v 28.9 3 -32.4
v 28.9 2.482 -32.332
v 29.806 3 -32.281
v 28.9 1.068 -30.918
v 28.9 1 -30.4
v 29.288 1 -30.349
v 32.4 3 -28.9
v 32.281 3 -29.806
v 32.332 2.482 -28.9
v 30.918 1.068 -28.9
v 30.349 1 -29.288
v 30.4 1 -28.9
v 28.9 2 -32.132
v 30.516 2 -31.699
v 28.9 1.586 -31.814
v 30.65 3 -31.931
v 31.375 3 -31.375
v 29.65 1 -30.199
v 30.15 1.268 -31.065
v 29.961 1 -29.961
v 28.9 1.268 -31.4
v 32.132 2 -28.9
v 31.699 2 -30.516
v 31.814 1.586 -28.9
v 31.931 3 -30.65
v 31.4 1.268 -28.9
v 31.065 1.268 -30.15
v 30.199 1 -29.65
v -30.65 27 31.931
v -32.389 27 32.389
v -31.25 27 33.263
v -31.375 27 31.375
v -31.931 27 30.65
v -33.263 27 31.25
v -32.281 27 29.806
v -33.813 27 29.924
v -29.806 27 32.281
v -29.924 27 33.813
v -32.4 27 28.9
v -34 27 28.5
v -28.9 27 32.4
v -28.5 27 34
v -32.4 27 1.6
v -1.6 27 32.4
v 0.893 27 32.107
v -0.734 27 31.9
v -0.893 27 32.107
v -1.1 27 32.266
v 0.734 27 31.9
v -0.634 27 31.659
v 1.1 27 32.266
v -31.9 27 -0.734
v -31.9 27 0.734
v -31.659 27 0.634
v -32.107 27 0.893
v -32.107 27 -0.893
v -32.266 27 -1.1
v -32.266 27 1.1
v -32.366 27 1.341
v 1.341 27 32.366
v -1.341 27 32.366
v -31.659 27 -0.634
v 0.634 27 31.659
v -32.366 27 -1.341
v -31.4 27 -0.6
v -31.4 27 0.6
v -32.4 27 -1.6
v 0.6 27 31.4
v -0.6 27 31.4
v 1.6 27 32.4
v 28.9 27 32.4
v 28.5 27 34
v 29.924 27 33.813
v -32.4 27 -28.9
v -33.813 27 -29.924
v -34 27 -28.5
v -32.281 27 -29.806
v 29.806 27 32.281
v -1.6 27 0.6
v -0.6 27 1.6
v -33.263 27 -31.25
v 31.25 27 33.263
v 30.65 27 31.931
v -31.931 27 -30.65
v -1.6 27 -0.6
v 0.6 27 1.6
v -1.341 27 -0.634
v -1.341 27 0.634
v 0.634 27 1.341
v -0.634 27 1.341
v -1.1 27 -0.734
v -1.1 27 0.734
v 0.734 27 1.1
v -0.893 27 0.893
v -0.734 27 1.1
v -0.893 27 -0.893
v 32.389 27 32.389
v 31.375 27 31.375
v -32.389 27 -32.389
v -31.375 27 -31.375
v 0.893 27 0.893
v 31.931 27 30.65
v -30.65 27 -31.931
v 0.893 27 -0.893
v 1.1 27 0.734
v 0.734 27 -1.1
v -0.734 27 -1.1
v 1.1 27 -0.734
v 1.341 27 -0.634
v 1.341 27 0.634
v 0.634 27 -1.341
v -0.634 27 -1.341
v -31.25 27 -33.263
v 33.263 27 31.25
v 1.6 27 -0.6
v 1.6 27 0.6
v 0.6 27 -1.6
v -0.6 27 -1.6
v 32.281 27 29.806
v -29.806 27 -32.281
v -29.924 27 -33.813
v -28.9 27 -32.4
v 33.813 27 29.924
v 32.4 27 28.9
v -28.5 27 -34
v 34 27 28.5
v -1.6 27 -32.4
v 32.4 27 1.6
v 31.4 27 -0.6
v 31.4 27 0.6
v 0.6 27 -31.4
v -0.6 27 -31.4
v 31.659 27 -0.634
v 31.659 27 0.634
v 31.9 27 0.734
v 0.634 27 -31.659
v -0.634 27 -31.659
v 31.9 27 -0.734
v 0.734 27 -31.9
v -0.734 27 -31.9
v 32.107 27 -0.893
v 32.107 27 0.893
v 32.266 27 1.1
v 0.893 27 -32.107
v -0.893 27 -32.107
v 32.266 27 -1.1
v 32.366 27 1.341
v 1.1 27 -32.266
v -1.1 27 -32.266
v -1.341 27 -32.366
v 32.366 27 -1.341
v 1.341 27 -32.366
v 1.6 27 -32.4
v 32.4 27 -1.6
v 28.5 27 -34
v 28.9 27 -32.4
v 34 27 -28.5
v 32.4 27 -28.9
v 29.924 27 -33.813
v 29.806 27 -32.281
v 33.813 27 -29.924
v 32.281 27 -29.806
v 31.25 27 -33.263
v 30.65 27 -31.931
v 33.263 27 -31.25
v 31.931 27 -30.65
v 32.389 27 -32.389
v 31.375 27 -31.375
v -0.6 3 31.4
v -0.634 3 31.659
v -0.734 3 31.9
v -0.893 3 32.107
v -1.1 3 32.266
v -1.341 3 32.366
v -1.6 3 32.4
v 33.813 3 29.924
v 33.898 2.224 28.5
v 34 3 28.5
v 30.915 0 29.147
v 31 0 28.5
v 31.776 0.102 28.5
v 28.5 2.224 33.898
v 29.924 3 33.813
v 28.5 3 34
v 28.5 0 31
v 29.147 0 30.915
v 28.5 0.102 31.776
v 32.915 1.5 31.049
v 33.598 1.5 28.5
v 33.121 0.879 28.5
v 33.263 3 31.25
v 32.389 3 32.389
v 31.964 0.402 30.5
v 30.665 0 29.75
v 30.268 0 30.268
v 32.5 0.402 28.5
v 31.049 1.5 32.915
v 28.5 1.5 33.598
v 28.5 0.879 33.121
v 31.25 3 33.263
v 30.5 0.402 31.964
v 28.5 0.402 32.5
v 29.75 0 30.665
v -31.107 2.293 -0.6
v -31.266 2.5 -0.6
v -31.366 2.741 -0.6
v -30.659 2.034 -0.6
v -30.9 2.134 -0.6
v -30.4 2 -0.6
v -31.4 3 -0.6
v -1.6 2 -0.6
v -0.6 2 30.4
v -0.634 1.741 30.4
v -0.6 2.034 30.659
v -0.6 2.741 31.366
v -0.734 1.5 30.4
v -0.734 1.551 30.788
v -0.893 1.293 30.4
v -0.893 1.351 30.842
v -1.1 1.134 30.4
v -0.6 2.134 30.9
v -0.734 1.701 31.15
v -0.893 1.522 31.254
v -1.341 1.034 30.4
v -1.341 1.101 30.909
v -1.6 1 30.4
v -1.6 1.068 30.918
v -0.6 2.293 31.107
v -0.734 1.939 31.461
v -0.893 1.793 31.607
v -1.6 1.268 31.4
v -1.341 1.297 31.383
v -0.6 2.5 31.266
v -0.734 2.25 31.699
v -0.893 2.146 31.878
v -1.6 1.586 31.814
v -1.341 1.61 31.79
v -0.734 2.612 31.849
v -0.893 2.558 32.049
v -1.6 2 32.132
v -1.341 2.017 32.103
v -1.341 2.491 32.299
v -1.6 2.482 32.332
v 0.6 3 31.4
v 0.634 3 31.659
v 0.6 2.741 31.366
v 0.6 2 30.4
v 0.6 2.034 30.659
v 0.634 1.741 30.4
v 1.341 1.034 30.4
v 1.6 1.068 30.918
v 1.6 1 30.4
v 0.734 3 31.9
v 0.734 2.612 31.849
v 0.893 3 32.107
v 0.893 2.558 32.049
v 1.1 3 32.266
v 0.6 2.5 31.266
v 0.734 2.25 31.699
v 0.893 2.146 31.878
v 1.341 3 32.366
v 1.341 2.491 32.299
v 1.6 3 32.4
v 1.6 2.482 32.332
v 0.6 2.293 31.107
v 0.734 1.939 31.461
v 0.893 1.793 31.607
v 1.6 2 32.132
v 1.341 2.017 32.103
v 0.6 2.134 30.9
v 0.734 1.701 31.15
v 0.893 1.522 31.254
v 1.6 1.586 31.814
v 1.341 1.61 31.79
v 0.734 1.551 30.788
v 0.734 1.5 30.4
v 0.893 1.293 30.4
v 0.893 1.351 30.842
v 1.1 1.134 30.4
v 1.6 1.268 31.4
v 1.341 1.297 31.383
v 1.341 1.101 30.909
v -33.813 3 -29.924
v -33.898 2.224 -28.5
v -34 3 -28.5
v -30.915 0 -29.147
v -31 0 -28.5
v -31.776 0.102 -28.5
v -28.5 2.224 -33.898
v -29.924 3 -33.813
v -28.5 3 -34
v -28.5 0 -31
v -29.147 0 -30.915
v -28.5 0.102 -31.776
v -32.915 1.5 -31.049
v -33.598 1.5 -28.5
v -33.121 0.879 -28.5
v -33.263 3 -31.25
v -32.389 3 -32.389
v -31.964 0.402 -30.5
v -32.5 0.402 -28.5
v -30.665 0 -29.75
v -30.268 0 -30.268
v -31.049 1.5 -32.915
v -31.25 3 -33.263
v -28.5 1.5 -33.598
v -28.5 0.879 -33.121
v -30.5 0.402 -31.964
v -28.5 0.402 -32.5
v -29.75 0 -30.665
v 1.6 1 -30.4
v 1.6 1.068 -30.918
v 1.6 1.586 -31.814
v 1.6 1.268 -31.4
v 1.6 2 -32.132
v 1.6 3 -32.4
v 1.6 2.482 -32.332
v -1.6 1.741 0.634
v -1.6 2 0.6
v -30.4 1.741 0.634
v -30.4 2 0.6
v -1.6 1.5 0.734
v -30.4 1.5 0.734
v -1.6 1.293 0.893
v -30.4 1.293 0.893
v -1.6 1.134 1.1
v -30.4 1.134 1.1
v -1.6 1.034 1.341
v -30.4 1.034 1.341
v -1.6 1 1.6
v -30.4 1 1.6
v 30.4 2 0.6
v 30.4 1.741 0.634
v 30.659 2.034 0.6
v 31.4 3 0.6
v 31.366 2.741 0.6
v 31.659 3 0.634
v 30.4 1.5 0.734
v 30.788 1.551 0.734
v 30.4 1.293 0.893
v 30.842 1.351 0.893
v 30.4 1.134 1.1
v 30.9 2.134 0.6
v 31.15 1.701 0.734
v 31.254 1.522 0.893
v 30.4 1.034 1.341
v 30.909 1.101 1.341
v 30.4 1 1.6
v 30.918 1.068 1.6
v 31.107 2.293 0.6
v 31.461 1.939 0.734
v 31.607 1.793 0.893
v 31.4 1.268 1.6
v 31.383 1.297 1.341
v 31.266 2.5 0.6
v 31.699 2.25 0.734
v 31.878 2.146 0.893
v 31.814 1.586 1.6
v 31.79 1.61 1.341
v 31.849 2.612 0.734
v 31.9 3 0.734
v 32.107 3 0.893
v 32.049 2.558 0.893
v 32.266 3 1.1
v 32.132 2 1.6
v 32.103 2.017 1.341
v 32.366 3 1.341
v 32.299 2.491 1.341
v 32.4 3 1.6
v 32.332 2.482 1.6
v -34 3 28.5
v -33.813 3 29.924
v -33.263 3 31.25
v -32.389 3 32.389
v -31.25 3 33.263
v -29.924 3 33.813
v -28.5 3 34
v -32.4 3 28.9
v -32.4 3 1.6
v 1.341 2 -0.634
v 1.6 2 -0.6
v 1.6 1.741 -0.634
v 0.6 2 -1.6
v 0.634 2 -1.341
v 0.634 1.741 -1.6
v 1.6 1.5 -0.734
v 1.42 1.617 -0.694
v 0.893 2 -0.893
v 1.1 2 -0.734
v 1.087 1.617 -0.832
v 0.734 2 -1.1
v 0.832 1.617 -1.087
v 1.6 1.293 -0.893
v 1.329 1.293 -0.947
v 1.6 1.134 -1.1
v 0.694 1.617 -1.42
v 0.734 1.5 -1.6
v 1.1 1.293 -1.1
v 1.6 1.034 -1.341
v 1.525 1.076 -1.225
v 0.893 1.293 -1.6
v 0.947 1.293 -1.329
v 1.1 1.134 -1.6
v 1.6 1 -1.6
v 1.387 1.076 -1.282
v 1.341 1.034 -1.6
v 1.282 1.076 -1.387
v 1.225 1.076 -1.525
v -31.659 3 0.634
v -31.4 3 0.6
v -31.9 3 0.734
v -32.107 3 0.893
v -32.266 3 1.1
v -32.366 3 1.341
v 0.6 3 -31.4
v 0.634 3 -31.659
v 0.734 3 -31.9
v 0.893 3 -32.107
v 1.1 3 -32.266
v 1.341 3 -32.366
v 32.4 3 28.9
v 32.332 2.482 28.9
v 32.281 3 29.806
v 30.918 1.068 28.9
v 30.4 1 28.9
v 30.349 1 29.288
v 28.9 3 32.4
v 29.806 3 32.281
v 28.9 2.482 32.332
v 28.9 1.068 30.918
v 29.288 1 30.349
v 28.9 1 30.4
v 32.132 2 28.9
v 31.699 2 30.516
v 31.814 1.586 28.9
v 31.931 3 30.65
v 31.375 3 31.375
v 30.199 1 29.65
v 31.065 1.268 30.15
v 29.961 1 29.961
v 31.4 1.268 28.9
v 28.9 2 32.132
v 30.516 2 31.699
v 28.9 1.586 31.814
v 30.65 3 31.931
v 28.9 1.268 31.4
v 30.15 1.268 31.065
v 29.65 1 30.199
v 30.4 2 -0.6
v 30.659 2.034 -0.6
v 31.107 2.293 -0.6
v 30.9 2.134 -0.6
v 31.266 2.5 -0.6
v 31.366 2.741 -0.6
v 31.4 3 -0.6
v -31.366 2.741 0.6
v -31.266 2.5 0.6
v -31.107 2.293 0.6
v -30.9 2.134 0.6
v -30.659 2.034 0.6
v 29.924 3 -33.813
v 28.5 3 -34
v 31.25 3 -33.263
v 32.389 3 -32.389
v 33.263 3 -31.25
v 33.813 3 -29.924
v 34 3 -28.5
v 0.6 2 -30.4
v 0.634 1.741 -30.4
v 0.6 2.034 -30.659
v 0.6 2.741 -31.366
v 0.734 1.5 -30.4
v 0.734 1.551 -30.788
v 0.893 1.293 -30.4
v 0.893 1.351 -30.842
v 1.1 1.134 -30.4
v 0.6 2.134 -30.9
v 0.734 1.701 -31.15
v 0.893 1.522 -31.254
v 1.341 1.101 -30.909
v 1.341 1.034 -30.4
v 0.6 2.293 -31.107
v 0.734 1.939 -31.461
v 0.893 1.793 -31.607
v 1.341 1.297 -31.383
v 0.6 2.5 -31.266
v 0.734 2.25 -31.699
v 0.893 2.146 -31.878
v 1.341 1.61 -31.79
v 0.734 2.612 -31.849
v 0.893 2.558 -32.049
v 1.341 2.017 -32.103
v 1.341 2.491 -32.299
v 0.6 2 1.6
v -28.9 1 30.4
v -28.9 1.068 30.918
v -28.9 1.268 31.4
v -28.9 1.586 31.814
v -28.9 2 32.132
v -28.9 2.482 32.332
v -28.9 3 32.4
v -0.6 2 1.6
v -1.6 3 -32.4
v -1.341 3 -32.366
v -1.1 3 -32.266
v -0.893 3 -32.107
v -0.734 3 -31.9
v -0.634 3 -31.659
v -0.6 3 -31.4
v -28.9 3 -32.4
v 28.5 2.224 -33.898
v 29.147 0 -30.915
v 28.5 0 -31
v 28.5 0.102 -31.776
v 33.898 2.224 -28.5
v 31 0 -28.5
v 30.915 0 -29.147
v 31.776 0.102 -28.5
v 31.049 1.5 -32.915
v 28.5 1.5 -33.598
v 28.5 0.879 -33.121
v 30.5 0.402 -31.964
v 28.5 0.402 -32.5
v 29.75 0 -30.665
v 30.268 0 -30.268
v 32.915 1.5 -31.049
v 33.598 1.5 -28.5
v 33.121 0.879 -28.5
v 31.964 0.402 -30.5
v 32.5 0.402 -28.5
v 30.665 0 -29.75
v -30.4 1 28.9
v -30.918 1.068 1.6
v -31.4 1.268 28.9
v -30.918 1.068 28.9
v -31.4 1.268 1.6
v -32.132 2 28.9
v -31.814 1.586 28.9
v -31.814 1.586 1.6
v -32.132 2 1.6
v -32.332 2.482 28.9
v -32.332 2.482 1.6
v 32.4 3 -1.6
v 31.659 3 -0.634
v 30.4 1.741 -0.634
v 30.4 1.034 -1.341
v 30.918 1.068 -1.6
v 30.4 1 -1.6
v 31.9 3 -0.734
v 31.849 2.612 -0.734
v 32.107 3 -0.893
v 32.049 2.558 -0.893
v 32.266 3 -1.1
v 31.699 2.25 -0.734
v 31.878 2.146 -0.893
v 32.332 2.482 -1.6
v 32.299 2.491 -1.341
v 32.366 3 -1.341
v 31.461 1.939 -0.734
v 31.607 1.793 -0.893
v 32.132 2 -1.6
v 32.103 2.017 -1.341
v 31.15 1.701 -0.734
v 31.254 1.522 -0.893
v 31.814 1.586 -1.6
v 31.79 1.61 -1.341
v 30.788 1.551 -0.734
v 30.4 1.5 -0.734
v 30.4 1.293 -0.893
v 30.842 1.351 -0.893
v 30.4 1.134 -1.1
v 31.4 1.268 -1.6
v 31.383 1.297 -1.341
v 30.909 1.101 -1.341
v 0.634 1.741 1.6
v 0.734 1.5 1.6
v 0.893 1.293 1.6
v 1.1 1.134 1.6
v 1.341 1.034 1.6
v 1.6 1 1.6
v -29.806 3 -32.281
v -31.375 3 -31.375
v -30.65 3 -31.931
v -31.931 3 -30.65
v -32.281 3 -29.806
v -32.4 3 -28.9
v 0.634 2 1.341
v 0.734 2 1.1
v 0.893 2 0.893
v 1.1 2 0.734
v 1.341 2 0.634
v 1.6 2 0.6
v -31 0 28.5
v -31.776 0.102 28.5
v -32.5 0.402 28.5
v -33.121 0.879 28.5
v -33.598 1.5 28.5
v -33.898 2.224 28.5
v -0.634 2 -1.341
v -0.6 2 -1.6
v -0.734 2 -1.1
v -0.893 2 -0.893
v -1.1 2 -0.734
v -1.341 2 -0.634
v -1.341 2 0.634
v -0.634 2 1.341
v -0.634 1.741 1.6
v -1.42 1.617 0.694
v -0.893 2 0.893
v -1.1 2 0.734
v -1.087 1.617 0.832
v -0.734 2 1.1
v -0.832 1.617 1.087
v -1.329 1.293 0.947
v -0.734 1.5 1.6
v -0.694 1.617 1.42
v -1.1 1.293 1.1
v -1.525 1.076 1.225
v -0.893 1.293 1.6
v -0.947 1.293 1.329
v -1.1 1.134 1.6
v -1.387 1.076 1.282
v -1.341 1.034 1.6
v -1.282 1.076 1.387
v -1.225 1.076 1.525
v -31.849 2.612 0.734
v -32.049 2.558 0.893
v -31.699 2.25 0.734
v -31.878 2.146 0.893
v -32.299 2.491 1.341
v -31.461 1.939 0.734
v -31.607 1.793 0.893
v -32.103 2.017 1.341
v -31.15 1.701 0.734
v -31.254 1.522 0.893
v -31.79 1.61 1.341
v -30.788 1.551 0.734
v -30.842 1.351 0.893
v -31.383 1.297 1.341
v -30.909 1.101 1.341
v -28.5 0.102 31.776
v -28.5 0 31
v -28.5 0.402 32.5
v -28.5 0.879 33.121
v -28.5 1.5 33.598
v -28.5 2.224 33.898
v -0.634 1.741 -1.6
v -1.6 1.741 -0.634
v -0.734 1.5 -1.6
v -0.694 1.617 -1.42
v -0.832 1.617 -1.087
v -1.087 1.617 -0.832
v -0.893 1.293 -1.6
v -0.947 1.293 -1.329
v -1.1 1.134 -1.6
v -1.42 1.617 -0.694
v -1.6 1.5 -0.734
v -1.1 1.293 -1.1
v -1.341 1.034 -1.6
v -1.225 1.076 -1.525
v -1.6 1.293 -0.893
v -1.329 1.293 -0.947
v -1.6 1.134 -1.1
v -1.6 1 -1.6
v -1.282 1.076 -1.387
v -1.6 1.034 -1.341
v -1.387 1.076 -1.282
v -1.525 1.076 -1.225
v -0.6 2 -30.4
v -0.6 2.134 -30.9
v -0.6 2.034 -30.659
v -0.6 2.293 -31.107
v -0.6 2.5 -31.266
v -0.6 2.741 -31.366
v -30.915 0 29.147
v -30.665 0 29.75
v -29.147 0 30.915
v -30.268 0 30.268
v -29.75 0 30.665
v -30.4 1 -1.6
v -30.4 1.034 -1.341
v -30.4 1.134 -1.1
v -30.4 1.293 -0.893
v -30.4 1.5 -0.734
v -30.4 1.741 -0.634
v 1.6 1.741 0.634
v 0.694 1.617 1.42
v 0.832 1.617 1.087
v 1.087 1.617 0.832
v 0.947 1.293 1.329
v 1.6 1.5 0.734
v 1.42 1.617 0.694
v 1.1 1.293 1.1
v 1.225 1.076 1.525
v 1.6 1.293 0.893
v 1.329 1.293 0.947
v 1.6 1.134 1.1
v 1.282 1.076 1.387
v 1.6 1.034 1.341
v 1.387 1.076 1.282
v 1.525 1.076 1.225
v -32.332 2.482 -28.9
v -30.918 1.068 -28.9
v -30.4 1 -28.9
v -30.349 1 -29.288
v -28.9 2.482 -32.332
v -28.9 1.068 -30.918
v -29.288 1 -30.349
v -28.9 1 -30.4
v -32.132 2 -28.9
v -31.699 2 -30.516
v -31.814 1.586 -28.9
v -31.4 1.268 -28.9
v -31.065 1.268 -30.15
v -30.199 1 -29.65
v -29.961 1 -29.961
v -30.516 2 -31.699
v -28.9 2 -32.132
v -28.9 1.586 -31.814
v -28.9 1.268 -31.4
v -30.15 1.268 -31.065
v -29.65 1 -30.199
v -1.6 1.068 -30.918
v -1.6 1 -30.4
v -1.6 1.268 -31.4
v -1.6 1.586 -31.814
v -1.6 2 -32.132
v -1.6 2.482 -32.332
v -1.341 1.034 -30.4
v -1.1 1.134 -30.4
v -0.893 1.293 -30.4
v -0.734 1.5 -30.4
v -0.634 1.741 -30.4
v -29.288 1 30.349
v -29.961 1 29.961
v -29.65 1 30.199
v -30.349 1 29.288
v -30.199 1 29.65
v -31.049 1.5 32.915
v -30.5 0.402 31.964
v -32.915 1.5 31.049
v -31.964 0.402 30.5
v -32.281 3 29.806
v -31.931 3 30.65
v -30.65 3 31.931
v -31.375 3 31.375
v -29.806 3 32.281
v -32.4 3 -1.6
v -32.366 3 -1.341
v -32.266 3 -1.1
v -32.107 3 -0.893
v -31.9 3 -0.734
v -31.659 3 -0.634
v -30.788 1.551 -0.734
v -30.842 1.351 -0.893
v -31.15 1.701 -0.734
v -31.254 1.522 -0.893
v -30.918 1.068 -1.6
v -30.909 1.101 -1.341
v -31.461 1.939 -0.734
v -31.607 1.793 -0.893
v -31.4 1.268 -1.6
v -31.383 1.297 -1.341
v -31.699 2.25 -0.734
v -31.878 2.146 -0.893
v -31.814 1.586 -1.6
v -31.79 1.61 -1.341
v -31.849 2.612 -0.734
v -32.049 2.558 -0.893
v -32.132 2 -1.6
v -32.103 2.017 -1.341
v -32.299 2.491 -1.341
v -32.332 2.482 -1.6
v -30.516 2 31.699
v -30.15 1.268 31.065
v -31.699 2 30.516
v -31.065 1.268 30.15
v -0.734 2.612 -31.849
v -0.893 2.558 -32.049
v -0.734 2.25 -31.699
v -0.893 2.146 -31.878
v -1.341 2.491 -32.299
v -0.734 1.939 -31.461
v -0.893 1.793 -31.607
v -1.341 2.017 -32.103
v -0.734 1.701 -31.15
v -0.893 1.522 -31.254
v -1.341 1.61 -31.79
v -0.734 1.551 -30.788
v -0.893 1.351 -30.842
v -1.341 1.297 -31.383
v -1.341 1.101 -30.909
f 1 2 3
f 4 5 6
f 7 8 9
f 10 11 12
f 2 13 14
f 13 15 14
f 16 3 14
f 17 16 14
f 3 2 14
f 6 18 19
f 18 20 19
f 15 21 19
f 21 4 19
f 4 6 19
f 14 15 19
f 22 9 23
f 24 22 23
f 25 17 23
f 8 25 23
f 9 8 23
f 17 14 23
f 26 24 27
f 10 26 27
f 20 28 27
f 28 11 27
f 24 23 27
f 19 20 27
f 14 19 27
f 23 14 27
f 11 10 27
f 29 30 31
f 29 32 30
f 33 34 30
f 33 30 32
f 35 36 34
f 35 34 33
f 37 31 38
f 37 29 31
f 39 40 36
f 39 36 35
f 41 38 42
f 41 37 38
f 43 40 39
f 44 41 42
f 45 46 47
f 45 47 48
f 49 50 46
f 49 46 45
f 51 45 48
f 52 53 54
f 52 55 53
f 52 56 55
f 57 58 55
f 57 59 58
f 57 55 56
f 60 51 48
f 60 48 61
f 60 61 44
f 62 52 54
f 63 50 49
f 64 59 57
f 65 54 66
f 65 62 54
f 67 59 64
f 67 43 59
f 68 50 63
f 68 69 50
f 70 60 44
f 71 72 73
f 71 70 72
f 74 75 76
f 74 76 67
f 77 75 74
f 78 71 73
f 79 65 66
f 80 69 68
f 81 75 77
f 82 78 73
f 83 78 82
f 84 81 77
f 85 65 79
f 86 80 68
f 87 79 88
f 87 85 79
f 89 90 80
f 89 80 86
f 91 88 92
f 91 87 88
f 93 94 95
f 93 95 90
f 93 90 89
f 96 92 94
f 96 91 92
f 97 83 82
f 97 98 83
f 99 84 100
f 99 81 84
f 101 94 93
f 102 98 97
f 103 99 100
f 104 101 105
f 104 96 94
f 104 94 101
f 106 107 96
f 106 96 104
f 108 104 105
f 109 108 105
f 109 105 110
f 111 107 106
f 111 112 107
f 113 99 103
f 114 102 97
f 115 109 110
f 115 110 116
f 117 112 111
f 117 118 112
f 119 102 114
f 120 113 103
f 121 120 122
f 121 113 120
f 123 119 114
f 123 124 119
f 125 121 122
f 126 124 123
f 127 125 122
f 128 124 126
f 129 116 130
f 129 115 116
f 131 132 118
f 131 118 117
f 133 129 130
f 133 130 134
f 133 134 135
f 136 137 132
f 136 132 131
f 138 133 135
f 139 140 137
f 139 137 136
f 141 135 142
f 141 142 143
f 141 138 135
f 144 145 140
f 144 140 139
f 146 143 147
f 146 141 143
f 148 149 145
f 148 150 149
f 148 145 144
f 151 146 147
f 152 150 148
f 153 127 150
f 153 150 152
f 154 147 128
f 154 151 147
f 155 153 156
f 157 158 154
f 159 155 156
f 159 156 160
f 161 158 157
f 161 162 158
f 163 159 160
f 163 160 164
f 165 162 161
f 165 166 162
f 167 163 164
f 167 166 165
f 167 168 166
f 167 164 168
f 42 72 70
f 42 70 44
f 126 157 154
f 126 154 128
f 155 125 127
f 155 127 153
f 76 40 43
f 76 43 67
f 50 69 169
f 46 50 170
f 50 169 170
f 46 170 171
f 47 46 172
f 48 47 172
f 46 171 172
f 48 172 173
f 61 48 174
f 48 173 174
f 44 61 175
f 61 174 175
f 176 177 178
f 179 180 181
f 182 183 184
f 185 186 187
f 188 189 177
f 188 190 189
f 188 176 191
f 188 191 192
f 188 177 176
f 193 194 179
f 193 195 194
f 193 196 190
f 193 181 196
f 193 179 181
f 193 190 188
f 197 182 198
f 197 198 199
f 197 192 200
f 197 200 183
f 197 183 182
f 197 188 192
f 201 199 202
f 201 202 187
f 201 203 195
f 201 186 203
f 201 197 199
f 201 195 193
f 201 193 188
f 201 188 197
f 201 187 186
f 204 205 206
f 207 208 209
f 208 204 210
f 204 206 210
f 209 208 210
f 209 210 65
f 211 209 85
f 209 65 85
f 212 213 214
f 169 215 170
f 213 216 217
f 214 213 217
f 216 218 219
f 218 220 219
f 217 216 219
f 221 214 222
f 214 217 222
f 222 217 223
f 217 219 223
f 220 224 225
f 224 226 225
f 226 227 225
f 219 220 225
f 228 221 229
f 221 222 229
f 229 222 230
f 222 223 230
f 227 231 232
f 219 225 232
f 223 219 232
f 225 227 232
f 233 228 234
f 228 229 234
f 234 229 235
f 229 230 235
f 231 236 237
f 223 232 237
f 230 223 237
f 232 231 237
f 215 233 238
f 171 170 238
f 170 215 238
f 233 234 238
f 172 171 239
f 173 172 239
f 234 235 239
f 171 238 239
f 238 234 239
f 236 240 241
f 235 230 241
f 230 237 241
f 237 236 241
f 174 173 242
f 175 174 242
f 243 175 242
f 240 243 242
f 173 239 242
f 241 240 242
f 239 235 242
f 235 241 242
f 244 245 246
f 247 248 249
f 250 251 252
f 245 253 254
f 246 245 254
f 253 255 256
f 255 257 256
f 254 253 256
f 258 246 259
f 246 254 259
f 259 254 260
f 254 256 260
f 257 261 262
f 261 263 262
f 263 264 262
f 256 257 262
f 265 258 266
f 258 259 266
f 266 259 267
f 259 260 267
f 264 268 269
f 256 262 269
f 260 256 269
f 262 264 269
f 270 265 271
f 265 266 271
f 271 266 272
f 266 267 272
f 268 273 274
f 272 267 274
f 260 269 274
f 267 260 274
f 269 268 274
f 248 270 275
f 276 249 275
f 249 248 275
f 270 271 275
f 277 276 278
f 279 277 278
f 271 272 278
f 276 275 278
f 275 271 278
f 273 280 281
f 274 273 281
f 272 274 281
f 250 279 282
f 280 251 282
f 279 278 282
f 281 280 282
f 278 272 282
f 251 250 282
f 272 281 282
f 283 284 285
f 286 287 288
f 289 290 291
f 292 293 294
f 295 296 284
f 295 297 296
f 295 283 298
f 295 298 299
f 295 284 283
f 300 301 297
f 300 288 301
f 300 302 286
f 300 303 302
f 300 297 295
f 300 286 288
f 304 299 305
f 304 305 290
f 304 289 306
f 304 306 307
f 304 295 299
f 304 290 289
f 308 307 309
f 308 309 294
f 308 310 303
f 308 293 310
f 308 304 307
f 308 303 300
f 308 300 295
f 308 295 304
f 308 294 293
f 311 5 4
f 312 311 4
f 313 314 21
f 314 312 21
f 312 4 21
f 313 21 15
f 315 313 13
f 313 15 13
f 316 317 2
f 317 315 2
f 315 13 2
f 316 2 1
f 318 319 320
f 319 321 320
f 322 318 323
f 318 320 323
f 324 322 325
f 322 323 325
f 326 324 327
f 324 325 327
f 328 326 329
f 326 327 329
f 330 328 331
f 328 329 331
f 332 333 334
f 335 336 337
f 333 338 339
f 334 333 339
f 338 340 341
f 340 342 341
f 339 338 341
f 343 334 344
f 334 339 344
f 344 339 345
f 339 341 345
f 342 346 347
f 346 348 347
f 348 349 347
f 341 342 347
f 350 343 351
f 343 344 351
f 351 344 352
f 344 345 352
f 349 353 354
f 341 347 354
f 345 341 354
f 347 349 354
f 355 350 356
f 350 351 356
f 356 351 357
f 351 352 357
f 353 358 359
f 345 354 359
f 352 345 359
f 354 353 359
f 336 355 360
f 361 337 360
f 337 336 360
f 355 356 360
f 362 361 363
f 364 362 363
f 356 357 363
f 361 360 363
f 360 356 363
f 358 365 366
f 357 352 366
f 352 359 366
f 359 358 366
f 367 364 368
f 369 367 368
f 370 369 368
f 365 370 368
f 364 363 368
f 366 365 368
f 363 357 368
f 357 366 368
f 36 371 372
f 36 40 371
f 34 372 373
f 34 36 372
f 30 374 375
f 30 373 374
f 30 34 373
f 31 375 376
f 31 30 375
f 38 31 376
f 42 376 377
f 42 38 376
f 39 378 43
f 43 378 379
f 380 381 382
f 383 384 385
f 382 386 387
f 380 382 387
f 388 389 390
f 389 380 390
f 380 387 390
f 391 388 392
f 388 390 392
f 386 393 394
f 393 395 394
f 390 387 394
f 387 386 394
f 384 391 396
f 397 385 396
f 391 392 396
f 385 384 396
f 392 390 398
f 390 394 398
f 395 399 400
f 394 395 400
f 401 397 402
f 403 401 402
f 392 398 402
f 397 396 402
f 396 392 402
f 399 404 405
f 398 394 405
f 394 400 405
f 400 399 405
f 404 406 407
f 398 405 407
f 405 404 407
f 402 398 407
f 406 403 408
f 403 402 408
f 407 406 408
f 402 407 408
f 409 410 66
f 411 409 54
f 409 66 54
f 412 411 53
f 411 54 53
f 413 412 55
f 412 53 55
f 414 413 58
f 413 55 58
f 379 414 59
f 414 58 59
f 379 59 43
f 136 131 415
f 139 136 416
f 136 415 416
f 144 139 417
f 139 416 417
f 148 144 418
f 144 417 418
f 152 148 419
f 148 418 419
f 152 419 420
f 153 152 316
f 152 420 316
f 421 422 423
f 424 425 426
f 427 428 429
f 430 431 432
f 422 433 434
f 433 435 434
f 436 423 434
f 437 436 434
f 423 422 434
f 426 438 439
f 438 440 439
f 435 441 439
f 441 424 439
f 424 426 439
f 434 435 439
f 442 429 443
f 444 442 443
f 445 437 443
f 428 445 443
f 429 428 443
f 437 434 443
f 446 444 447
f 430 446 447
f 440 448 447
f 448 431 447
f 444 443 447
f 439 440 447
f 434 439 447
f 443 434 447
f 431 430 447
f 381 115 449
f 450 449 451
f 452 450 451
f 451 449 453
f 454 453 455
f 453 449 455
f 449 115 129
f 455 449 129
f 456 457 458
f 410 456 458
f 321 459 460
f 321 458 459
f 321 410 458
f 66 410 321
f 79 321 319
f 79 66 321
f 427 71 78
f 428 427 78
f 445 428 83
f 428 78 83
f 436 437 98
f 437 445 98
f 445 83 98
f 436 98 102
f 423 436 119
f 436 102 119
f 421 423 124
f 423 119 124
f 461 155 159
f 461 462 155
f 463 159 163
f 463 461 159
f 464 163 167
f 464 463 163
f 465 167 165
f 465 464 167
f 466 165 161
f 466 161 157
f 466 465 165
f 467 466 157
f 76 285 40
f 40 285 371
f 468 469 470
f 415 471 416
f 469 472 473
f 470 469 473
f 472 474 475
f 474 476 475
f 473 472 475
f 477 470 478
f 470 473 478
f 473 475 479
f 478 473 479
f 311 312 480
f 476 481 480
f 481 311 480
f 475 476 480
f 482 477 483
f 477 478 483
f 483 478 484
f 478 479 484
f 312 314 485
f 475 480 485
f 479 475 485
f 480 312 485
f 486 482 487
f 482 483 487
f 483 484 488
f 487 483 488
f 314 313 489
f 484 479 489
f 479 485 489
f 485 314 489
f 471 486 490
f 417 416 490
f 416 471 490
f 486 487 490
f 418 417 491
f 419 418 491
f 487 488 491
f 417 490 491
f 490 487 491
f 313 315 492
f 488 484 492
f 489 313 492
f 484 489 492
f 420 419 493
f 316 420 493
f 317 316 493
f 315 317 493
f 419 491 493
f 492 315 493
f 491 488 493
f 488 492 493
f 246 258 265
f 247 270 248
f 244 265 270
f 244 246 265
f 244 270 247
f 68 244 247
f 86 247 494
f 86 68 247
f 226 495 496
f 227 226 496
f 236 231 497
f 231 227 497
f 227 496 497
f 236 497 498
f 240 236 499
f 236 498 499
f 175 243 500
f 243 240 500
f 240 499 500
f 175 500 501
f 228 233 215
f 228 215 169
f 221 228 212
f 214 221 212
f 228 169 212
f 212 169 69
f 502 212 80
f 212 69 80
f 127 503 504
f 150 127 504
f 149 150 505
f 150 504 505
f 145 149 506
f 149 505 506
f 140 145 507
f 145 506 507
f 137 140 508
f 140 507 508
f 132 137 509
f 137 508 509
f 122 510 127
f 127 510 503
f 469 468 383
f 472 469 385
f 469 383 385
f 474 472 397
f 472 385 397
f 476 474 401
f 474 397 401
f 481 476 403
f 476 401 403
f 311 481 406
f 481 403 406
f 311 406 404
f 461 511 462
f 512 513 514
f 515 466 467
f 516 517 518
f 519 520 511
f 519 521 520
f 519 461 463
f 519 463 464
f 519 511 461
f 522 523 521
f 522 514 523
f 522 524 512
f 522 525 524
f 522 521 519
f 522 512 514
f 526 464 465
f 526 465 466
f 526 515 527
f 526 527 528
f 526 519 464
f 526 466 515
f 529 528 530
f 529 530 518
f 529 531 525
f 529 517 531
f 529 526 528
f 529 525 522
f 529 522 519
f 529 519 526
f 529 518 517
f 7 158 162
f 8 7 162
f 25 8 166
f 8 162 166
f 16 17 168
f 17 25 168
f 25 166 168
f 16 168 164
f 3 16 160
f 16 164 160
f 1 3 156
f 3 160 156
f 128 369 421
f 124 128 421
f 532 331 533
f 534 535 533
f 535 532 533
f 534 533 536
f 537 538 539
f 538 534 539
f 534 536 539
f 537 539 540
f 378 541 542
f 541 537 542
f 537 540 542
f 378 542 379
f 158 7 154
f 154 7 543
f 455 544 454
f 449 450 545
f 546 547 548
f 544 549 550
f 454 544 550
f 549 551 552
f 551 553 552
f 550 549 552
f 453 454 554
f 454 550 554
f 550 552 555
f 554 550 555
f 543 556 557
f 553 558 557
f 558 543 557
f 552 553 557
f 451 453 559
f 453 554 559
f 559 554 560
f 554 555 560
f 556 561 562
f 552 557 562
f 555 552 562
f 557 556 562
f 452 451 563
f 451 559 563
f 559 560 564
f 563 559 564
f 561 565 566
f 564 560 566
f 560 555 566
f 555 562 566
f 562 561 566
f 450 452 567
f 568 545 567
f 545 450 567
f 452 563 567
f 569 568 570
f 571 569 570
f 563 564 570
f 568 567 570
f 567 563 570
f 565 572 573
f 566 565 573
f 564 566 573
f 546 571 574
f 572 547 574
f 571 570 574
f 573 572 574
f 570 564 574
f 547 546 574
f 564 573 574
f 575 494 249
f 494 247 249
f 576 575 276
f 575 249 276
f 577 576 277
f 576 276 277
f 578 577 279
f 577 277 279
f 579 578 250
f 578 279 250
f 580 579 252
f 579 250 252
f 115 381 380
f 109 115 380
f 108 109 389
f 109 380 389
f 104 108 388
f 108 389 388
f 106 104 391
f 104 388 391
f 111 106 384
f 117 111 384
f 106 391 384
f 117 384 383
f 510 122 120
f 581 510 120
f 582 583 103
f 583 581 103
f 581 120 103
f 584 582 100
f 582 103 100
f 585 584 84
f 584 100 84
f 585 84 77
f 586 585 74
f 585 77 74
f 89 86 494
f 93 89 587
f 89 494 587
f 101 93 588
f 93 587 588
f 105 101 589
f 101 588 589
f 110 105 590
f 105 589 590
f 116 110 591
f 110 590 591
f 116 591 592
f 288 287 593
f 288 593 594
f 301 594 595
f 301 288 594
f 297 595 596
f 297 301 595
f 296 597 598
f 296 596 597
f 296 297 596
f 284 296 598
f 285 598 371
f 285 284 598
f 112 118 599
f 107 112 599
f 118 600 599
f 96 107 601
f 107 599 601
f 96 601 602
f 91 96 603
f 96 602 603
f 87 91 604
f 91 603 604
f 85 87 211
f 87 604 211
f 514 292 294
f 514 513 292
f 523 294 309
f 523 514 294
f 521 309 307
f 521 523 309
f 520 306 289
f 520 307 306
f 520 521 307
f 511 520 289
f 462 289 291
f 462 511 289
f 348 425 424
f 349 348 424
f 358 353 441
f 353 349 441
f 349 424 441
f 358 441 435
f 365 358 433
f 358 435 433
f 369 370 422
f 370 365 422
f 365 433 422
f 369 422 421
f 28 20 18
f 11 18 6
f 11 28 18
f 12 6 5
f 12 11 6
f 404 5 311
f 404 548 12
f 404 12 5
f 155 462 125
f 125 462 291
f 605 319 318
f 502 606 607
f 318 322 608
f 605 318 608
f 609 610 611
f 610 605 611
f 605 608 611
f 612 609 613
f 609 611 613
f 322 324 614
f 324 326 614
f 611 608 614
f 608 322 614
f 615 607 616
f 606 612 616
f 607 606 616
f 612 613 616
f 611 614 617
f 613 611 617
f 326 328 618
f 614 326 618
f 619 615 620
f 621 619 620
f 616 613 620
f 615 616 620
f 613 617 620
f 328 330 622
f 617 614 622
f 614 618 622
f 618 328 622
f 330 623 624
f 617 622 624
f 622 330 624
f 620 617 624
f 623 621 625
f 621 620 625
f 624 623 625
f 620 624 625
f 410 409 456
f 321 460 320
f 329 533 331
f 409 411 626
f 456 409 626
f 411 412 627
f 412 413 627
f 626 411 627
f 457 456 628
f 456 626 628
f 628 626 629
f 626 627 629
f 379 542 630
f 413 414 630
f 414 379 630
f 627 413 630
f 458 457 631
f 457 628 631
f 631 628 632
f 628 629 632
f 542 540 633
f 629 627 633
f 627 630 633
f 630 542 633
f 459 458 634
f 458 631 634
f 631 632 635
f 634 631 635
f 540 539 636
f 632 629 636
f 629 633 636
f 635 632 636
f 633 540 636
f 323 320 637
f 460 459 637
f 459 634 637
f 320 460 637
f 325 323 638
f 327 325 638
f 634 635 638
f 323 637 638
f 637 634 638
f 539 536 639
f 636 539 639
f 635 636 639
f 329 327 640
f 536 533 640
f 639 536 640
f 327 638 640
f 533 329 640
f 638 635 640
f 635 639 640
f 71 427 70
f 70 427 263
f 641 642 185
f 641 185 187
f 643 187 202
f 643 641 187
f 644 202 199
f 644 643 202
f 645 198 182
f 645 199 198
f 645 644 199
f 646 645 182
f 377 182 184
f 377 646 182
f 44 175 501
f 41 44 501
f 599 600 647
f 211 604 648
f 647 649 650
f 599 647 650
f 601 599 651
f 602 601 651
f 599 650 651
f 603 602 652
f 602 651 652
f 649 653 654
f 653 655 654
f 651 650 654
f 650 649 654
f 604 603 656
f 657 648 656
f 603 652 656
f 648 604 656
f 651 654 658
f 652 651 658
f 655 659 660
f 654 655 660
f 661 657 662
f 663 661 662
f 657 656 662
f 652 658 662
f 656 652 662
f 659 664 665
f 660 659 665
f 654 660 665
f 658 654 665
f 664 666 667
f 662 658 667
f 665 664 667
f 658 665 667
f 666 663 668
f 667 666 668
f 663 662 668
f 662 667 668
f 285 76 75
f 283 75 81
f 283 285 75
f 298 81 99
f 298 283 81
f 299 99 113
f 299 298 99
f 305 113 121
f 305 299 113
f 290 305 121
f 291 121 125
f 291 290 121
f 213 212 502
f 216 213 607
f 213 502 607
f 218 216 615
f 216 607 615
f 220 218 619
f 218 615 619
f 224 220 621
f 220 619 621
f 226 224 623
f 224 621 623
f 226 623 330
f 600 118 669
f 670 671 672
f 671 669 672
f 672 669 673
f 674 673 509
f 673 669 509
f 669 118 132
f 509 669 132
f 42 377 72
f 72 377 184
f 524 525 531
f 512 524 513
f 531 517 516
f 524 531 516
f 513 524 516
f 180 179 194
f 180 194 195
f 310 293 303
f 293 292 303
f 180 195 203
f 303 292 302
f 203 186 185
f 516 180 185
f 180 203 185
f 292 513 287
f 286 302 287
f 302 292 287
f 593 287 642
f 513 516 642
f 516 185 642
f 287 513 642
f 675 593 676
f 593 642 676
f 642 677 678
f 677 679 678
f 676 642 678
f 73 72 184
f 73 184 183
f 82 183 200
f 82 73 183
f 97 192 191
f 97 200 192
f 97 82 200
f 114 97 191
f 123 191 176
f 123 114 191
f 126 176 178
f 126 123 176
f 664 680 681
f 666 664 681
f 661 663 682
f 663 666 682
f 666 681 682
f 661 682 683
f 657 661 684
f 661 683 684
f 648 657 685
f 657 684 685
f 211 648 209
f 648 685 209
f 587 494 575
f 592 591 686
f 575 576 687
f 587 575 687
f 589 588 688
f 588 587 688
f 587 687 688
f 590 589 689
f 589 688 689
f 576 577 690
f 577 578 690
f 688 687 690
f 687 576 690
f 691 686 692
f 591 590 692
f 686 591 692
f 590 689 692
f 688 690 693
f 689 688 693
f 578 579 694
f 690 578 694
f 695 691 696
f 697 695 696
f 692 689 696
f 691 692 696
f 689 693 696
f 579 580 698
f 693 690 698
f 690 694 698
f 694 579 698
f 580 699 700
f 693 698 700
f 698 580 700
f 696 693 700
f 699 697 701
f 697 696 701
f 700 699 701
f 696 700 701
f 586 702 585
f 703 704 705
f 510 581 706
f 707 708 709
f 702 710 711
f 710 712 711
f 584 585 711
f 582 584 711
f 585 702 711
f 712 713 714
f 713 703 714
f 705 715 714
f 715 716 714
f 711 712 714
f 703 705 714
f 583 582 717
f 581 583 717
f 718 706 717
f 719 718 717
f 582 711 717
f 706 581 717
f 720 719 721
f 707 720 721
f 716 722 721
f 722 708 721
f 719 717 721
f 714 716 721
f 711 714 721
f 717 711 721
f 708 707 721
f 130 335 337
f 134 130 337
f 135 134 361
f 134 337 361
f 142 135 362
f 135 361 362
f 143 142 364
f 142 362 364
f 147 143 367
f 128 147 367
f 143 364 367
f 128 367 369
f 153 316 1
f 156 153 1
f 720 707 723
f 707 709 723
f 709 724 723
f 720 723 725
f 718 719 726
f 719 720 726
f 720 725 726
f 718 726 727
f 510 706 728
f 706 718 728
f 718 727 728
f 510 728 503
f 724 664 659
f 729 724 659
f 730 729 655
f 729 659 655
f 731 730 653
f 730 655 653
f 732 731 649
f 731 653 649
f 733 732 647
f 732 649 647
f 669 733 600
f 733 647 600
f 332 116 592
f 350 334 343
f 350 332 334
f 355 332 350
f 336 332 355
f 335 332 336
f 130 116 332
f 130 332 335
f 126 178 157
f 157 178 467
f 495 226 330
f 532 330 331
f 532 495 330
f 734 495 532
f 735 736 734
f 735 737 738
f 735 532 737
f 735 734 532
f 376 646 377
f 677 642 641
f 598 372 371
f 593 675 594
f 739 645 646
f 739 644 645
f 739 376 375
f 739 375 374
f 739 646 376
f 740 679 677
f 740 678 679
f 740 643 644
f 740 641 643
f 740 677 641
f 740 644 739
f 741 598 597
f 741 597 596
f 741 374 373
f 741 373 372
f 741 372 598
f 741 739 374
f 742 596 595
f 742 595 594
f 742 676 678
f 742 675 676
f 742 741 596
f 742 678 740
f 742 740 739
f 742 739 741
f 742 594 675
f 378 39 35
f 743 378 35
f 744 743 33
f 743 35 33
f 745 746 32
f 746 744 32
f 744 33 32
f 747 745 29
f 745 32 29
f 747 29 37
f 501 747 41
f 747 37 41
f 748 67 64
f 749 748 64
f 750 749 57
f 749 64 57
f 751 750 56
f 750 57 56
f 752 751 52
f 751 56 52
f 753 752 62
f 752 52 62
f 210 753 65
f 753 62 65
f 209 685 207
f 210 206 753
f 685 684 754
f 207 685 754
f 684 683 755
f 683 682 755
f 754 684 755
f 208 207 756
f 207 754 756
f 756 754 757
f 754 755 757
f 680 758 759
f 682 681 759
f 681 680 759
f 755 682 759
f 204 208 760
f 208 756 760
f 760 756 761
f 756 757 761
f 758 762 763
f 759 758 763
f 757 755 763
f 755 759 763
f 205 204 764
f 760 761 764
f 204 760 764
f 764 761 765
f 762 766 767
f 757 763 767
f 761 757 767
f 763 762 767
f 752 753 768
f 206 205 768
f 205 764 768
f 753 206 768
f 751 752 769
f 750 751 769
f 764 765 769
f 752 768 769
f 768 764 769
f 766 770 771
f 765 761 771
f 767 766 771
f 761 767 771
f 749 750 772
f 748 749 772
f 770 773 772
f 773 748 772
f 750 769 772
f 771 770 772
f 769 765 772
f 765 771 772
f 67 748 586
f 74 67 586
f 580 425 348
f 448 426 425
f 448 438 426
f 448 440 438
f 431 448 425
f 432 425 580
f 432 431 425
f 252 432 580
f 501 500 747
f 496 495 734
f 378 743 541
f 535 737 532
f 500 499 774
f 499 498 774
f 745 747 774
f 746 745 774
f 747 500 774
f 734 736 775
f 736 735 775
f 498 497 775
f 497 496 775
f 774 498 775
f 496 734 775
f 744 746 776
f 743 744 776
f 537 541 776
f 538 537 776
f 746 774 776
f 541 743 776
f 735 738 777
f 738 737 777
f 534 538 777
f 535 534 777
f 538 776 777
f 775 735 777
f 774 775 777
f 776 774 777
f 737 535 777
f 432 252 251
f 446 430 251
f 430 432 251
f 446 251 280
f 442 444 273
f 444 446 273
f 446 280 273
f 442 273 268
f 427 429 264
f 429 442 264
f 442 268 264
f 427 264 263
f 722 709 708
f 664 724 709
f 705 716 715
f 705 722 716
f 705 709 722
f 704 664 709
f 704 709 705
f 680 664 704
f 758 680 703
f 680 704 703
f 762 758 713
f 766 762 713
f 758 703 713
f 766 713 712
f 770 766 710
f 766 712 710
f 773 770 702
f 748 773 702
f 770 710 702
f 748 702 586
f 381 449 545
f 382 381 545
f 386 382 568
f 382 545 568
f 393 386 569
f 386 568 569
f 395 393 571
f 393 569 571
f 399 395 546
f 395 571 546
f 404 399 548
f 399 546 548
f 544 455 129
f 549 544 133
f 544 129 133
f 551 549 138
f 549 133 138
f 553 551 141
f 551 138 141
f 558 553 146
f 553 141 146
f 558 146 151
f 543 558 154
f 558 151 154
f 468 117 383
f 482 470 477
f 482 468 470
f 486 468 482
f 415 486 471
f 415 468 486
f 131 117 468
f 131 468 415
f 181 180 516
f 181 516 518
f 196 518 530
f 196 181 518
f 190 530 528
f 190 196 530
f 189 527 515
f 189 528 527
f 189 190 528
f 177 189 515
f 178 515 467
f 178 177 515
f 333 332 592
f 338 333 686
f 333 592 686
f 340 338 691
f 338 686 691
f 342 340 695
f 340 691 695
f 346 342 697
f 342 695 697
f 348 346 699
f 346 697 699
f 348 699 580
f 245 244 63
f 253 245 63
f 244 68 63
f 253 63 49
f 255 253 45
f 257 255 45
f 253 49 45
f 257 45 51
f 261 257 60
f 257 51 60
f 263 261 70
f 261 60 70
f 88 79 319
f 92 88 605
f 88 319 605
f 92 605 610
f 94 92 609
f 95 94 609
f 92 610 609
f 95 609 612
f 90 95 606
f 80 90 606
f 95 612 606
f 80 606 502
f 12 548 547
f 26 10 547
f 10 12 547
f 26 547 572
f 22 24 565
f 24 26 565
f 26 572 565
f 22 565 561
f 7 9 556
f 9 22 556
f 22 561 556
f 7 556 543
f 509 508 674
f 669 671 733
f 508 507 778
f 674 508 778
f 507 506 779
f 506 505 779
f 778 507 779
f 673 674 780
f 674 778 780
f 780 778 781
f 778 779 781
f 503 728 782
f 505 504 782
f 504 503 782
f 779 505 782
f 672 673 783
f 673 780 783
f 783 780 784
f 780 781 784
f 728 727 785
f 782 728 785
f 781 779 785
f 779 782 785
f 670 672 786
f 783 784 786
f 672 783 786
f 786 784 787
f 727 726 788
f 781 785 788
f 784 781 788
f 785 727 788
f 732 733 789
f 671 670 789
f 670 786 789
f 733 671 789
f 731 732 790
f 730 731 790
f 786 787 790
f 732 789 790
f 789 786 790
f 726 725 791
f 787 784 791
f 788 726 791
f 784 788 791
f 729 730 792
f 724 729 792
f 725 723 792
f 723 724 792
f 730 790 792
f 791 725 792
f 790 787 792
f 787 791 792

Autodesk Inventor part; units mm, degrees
ref_plane "YZ Plane" through (0, 0, 0) normal (1, 0, 0) x (0, 1, 0)
ref_plane "XZ Plane" through (0, 0, 0) normal (0, 1, 0) x (-1, 0, 0)
ref_plane "XY Plane" through (0, 0, 0) normal (0, 0, 1) x (1, 0, 0)
sketch "Sketch1" plane through (0, 0, 0) normal (0, 1, 0) x (-1, 0, 0)
  line L0 (34, 34) -> (-34, 34)
  line L1 (-34, 34) -> (-34, -34)
  line L2 (-34, -34) -> (34, -34)
  line L3 (34, -34) -> (34, 34)
  line L4 (34, 34) -> (-34, -34) construction
  line L5 (-34, 34) -> (34, -34) construction
  point P0 (0, 0)
  dimension "d0" = 68
  dimension "d1" = 68
extrude "Extrusion1" add sketch "Sketch1" along normal blind 1
sketch "Sketch2" plane through (0, 1, 0) normal (0, 1, 0) x (1, 0, 0)
  line L0 (34, -34) -> (34, 34) projected
  line L1 (34, 34) -> (-34, 34) projected
  line L2 (-34, 34) -> (-34, -34) projected
  line L3 (-34, -34) -> (34, -34) projected
  line L4 (-32.4, -32.4) -> (-32.4, 32.4)
  line L5 (-32.4, 32.4) -> (32.4, 32.4)
  line L6 (32.4, 32.4) -> (32.4, -32.4)
  line L7 (32.4, -32.4) -> (-32.4, -32.4)
  point P0 (0, 0)
  dimension "d4" = 1.6
extrude "Extrusion2" add sketch "Sketch2" along normal blind 26
fillet "Fillet1" radius 3.5 4 edges at (-32.4, 14, 32.4) (-32.4, 14, -32.4) (32.4, 14, -32.4) (32.4, 14, 32.4)
fillet "Fillet2" radius 5.5 4 edges at (34, 13.5, 34) (34, 13.5, -34) (-34, 13.5, -34) (-34, 13.5, 34)
fillet "Fillet3" radius 2 8 edges at (-31.3749, 1, 31.3749) (0, 1, 32.4) (31.3749, 1, 31.3749) (32.4, 1, 0) (31.3749, 1, -31.3749) (0, 1, -32.4) (-31.3749, 1, -31.3749) (-32.4, 1, 0)
fillet "Fillet4" radius 3 8 edges at (-32.3891, 0, 32.3891) (0, 0, 34) (32.3891, 0, 32.3891) (34, 0, 0) (32.3891, 0, -32.3891) (0, 0, -34) (-32.3891, 0, -32.3891) (-34, 0, 0)
sketch "Sketch3" plane through (0, 27, 0) normal (0, 1, 0) x (1, 0, 0)
  arc A0 (-34, -28.5) -> (-28.5, -34) centre (-28.5, -28.5) ccw projected
  line L0 (-28.5, -34) -> (28.5, -34) projected
  arc A1 (28.5, -34) -> (34, -28.5) centre (28.5, -28.5) ccw projected
  line L1 (34, -28.5) -> (34, 28.5) projected
  arc A2 (34, 28.5) -> (28.5, 34) centre (28.5, 28.5) ccw projected
  line L2 (28.5, 34) -> (-28.5, 34) projected
  arc A3 (-28.5, 34) -> (-34, 28.5) centre (-28.5, 28.5) ccw projected
  line L3 (-34, 28.5) -> (-34, -28.5) projected
  line L4 (-32.4, -28.9) -> (-32.4, 28.9) projected
  arc A4 (-28.9, 32.4) -> (-32.4, 28.9) centre (-28.9, 28.9) ccw projected
  line L5 (-28.9, 32.4) -> (28.9, 32.4) projected
  arc A5 (32.4, 28.9) -> (28.9, 32.4) centre (28.9, 28.9) ccw projected
  line L6 (32.4, 28.9) -> (32.4, -28.9) projected
  arc A6 (28.9, -32.4) -> (32.4, -28.9) centre (28.9, -28.9) ccw projected
  line L7 (28.9, -32.4) -> (-28.9, -32.4) projected
  arc A7 (-32.4, -28.9) -> (-28.9, -32.4) centre (-28.9, -28.9) ccw projected
  line L8 (-34, 28.5) -> (-34, -28.5) projected
  line L9 (-34, 0) -> (34, 0)
  line L10 (34, -28.5) -> (34, 28.5) projected
  line L11 (-28.5, -34) -> (28.5, -34) projected
  line L12 (0, -34) -> (0, 34)
  line L13 (-0.6, -34) -> (-0.6, 34)
  line L14 (0.6, -34) -> (0.6, 34)
  line L15 (-34, 0.6) -> (34, 0.6)
  line L16 (-34, -0.6) -> (34, -0.6)
  point P0 (0, 0)
  point P1 (-0.6, 0.6)
  point P2 (-32.4, 0.6)
  point P3 (-32.4, -0.6)
  point P4 (-0.6, -0.6)
  point P5 (-0.6, -32.4)
  point P6 (0.6, -32.4)
  point P7 (0.6, -0.6)
  point P8 (32.4, -0.6)
  point P9 (32.4, 0.6)
  point P10 (0.6, 0.6)
  point P11 (0.6, 32.4)
  point P12 (-0.6, 32.4)
  dimension "d11" = 0.6
  dimension "d12" = 0.6
  dimension "d13" = 0.6
  dimension "d14" = 0.6
extrude "Extrusion3" add sketch "Sketch3" against normal up to surface (26 mm away) contours L4 L9 L13 L16 | L13 L16 L12 L7 | L4 L15 L13 L9 | L13 L9 L12 L16 | L12 L16 L14 L7 | L13 L15 L12 L9 | L12 L9 L14 L16 | L13 L5 L12 L15 | L12 L15 L14 L9 | L14 L9 L6 L16 | L12 L5 L14 L15 | L14 L15 L6 L9
fillet "Fillet5" radius 1 4 edges at (0.6, 14, 0.6) (-0.6, 14, 0.6) (0.6, 14, -0.6) (-0.6, 14, -0.6)
fillet "Fillet6" radius 1 28 edges at (0.6, 1.5858, 31.8142) (0.6, 1, 16) (0.8929, 1, 0.8929) (16, 1, 0.6) (31.8142, 1.5858, 0.6) (32.4, 15, 0.6) (0.6, 15, 32.4) (31.8142, 1.5858, -0.6) (32.4, 15, -0.6) (0.8929, 1, -0.8929) (0.6, 1, -16) (0.6, 1.5858, -31.8142) (0.6, 15, -32.4) (16, 1, -0.6) (-0.8929, 1, -0.8929) (-0.6, 1, -16) (-0.6, 1.5858, -31.8142) (-0.6, 15, -32.4) (-31.8142, 1.5858, -0.6) (-32.4, 15, -0.6) (-16, 1, -0.6) (-31.8142, 1.5858, 0.6) (-32.4, 15, 0.6) (-0.8929, 1, 0.8929) (-0.6, 1, 16) (-0.6, 1.5858, 31.8142) (-0.6, 15, 32.4) (-16, 1, 0.6)
